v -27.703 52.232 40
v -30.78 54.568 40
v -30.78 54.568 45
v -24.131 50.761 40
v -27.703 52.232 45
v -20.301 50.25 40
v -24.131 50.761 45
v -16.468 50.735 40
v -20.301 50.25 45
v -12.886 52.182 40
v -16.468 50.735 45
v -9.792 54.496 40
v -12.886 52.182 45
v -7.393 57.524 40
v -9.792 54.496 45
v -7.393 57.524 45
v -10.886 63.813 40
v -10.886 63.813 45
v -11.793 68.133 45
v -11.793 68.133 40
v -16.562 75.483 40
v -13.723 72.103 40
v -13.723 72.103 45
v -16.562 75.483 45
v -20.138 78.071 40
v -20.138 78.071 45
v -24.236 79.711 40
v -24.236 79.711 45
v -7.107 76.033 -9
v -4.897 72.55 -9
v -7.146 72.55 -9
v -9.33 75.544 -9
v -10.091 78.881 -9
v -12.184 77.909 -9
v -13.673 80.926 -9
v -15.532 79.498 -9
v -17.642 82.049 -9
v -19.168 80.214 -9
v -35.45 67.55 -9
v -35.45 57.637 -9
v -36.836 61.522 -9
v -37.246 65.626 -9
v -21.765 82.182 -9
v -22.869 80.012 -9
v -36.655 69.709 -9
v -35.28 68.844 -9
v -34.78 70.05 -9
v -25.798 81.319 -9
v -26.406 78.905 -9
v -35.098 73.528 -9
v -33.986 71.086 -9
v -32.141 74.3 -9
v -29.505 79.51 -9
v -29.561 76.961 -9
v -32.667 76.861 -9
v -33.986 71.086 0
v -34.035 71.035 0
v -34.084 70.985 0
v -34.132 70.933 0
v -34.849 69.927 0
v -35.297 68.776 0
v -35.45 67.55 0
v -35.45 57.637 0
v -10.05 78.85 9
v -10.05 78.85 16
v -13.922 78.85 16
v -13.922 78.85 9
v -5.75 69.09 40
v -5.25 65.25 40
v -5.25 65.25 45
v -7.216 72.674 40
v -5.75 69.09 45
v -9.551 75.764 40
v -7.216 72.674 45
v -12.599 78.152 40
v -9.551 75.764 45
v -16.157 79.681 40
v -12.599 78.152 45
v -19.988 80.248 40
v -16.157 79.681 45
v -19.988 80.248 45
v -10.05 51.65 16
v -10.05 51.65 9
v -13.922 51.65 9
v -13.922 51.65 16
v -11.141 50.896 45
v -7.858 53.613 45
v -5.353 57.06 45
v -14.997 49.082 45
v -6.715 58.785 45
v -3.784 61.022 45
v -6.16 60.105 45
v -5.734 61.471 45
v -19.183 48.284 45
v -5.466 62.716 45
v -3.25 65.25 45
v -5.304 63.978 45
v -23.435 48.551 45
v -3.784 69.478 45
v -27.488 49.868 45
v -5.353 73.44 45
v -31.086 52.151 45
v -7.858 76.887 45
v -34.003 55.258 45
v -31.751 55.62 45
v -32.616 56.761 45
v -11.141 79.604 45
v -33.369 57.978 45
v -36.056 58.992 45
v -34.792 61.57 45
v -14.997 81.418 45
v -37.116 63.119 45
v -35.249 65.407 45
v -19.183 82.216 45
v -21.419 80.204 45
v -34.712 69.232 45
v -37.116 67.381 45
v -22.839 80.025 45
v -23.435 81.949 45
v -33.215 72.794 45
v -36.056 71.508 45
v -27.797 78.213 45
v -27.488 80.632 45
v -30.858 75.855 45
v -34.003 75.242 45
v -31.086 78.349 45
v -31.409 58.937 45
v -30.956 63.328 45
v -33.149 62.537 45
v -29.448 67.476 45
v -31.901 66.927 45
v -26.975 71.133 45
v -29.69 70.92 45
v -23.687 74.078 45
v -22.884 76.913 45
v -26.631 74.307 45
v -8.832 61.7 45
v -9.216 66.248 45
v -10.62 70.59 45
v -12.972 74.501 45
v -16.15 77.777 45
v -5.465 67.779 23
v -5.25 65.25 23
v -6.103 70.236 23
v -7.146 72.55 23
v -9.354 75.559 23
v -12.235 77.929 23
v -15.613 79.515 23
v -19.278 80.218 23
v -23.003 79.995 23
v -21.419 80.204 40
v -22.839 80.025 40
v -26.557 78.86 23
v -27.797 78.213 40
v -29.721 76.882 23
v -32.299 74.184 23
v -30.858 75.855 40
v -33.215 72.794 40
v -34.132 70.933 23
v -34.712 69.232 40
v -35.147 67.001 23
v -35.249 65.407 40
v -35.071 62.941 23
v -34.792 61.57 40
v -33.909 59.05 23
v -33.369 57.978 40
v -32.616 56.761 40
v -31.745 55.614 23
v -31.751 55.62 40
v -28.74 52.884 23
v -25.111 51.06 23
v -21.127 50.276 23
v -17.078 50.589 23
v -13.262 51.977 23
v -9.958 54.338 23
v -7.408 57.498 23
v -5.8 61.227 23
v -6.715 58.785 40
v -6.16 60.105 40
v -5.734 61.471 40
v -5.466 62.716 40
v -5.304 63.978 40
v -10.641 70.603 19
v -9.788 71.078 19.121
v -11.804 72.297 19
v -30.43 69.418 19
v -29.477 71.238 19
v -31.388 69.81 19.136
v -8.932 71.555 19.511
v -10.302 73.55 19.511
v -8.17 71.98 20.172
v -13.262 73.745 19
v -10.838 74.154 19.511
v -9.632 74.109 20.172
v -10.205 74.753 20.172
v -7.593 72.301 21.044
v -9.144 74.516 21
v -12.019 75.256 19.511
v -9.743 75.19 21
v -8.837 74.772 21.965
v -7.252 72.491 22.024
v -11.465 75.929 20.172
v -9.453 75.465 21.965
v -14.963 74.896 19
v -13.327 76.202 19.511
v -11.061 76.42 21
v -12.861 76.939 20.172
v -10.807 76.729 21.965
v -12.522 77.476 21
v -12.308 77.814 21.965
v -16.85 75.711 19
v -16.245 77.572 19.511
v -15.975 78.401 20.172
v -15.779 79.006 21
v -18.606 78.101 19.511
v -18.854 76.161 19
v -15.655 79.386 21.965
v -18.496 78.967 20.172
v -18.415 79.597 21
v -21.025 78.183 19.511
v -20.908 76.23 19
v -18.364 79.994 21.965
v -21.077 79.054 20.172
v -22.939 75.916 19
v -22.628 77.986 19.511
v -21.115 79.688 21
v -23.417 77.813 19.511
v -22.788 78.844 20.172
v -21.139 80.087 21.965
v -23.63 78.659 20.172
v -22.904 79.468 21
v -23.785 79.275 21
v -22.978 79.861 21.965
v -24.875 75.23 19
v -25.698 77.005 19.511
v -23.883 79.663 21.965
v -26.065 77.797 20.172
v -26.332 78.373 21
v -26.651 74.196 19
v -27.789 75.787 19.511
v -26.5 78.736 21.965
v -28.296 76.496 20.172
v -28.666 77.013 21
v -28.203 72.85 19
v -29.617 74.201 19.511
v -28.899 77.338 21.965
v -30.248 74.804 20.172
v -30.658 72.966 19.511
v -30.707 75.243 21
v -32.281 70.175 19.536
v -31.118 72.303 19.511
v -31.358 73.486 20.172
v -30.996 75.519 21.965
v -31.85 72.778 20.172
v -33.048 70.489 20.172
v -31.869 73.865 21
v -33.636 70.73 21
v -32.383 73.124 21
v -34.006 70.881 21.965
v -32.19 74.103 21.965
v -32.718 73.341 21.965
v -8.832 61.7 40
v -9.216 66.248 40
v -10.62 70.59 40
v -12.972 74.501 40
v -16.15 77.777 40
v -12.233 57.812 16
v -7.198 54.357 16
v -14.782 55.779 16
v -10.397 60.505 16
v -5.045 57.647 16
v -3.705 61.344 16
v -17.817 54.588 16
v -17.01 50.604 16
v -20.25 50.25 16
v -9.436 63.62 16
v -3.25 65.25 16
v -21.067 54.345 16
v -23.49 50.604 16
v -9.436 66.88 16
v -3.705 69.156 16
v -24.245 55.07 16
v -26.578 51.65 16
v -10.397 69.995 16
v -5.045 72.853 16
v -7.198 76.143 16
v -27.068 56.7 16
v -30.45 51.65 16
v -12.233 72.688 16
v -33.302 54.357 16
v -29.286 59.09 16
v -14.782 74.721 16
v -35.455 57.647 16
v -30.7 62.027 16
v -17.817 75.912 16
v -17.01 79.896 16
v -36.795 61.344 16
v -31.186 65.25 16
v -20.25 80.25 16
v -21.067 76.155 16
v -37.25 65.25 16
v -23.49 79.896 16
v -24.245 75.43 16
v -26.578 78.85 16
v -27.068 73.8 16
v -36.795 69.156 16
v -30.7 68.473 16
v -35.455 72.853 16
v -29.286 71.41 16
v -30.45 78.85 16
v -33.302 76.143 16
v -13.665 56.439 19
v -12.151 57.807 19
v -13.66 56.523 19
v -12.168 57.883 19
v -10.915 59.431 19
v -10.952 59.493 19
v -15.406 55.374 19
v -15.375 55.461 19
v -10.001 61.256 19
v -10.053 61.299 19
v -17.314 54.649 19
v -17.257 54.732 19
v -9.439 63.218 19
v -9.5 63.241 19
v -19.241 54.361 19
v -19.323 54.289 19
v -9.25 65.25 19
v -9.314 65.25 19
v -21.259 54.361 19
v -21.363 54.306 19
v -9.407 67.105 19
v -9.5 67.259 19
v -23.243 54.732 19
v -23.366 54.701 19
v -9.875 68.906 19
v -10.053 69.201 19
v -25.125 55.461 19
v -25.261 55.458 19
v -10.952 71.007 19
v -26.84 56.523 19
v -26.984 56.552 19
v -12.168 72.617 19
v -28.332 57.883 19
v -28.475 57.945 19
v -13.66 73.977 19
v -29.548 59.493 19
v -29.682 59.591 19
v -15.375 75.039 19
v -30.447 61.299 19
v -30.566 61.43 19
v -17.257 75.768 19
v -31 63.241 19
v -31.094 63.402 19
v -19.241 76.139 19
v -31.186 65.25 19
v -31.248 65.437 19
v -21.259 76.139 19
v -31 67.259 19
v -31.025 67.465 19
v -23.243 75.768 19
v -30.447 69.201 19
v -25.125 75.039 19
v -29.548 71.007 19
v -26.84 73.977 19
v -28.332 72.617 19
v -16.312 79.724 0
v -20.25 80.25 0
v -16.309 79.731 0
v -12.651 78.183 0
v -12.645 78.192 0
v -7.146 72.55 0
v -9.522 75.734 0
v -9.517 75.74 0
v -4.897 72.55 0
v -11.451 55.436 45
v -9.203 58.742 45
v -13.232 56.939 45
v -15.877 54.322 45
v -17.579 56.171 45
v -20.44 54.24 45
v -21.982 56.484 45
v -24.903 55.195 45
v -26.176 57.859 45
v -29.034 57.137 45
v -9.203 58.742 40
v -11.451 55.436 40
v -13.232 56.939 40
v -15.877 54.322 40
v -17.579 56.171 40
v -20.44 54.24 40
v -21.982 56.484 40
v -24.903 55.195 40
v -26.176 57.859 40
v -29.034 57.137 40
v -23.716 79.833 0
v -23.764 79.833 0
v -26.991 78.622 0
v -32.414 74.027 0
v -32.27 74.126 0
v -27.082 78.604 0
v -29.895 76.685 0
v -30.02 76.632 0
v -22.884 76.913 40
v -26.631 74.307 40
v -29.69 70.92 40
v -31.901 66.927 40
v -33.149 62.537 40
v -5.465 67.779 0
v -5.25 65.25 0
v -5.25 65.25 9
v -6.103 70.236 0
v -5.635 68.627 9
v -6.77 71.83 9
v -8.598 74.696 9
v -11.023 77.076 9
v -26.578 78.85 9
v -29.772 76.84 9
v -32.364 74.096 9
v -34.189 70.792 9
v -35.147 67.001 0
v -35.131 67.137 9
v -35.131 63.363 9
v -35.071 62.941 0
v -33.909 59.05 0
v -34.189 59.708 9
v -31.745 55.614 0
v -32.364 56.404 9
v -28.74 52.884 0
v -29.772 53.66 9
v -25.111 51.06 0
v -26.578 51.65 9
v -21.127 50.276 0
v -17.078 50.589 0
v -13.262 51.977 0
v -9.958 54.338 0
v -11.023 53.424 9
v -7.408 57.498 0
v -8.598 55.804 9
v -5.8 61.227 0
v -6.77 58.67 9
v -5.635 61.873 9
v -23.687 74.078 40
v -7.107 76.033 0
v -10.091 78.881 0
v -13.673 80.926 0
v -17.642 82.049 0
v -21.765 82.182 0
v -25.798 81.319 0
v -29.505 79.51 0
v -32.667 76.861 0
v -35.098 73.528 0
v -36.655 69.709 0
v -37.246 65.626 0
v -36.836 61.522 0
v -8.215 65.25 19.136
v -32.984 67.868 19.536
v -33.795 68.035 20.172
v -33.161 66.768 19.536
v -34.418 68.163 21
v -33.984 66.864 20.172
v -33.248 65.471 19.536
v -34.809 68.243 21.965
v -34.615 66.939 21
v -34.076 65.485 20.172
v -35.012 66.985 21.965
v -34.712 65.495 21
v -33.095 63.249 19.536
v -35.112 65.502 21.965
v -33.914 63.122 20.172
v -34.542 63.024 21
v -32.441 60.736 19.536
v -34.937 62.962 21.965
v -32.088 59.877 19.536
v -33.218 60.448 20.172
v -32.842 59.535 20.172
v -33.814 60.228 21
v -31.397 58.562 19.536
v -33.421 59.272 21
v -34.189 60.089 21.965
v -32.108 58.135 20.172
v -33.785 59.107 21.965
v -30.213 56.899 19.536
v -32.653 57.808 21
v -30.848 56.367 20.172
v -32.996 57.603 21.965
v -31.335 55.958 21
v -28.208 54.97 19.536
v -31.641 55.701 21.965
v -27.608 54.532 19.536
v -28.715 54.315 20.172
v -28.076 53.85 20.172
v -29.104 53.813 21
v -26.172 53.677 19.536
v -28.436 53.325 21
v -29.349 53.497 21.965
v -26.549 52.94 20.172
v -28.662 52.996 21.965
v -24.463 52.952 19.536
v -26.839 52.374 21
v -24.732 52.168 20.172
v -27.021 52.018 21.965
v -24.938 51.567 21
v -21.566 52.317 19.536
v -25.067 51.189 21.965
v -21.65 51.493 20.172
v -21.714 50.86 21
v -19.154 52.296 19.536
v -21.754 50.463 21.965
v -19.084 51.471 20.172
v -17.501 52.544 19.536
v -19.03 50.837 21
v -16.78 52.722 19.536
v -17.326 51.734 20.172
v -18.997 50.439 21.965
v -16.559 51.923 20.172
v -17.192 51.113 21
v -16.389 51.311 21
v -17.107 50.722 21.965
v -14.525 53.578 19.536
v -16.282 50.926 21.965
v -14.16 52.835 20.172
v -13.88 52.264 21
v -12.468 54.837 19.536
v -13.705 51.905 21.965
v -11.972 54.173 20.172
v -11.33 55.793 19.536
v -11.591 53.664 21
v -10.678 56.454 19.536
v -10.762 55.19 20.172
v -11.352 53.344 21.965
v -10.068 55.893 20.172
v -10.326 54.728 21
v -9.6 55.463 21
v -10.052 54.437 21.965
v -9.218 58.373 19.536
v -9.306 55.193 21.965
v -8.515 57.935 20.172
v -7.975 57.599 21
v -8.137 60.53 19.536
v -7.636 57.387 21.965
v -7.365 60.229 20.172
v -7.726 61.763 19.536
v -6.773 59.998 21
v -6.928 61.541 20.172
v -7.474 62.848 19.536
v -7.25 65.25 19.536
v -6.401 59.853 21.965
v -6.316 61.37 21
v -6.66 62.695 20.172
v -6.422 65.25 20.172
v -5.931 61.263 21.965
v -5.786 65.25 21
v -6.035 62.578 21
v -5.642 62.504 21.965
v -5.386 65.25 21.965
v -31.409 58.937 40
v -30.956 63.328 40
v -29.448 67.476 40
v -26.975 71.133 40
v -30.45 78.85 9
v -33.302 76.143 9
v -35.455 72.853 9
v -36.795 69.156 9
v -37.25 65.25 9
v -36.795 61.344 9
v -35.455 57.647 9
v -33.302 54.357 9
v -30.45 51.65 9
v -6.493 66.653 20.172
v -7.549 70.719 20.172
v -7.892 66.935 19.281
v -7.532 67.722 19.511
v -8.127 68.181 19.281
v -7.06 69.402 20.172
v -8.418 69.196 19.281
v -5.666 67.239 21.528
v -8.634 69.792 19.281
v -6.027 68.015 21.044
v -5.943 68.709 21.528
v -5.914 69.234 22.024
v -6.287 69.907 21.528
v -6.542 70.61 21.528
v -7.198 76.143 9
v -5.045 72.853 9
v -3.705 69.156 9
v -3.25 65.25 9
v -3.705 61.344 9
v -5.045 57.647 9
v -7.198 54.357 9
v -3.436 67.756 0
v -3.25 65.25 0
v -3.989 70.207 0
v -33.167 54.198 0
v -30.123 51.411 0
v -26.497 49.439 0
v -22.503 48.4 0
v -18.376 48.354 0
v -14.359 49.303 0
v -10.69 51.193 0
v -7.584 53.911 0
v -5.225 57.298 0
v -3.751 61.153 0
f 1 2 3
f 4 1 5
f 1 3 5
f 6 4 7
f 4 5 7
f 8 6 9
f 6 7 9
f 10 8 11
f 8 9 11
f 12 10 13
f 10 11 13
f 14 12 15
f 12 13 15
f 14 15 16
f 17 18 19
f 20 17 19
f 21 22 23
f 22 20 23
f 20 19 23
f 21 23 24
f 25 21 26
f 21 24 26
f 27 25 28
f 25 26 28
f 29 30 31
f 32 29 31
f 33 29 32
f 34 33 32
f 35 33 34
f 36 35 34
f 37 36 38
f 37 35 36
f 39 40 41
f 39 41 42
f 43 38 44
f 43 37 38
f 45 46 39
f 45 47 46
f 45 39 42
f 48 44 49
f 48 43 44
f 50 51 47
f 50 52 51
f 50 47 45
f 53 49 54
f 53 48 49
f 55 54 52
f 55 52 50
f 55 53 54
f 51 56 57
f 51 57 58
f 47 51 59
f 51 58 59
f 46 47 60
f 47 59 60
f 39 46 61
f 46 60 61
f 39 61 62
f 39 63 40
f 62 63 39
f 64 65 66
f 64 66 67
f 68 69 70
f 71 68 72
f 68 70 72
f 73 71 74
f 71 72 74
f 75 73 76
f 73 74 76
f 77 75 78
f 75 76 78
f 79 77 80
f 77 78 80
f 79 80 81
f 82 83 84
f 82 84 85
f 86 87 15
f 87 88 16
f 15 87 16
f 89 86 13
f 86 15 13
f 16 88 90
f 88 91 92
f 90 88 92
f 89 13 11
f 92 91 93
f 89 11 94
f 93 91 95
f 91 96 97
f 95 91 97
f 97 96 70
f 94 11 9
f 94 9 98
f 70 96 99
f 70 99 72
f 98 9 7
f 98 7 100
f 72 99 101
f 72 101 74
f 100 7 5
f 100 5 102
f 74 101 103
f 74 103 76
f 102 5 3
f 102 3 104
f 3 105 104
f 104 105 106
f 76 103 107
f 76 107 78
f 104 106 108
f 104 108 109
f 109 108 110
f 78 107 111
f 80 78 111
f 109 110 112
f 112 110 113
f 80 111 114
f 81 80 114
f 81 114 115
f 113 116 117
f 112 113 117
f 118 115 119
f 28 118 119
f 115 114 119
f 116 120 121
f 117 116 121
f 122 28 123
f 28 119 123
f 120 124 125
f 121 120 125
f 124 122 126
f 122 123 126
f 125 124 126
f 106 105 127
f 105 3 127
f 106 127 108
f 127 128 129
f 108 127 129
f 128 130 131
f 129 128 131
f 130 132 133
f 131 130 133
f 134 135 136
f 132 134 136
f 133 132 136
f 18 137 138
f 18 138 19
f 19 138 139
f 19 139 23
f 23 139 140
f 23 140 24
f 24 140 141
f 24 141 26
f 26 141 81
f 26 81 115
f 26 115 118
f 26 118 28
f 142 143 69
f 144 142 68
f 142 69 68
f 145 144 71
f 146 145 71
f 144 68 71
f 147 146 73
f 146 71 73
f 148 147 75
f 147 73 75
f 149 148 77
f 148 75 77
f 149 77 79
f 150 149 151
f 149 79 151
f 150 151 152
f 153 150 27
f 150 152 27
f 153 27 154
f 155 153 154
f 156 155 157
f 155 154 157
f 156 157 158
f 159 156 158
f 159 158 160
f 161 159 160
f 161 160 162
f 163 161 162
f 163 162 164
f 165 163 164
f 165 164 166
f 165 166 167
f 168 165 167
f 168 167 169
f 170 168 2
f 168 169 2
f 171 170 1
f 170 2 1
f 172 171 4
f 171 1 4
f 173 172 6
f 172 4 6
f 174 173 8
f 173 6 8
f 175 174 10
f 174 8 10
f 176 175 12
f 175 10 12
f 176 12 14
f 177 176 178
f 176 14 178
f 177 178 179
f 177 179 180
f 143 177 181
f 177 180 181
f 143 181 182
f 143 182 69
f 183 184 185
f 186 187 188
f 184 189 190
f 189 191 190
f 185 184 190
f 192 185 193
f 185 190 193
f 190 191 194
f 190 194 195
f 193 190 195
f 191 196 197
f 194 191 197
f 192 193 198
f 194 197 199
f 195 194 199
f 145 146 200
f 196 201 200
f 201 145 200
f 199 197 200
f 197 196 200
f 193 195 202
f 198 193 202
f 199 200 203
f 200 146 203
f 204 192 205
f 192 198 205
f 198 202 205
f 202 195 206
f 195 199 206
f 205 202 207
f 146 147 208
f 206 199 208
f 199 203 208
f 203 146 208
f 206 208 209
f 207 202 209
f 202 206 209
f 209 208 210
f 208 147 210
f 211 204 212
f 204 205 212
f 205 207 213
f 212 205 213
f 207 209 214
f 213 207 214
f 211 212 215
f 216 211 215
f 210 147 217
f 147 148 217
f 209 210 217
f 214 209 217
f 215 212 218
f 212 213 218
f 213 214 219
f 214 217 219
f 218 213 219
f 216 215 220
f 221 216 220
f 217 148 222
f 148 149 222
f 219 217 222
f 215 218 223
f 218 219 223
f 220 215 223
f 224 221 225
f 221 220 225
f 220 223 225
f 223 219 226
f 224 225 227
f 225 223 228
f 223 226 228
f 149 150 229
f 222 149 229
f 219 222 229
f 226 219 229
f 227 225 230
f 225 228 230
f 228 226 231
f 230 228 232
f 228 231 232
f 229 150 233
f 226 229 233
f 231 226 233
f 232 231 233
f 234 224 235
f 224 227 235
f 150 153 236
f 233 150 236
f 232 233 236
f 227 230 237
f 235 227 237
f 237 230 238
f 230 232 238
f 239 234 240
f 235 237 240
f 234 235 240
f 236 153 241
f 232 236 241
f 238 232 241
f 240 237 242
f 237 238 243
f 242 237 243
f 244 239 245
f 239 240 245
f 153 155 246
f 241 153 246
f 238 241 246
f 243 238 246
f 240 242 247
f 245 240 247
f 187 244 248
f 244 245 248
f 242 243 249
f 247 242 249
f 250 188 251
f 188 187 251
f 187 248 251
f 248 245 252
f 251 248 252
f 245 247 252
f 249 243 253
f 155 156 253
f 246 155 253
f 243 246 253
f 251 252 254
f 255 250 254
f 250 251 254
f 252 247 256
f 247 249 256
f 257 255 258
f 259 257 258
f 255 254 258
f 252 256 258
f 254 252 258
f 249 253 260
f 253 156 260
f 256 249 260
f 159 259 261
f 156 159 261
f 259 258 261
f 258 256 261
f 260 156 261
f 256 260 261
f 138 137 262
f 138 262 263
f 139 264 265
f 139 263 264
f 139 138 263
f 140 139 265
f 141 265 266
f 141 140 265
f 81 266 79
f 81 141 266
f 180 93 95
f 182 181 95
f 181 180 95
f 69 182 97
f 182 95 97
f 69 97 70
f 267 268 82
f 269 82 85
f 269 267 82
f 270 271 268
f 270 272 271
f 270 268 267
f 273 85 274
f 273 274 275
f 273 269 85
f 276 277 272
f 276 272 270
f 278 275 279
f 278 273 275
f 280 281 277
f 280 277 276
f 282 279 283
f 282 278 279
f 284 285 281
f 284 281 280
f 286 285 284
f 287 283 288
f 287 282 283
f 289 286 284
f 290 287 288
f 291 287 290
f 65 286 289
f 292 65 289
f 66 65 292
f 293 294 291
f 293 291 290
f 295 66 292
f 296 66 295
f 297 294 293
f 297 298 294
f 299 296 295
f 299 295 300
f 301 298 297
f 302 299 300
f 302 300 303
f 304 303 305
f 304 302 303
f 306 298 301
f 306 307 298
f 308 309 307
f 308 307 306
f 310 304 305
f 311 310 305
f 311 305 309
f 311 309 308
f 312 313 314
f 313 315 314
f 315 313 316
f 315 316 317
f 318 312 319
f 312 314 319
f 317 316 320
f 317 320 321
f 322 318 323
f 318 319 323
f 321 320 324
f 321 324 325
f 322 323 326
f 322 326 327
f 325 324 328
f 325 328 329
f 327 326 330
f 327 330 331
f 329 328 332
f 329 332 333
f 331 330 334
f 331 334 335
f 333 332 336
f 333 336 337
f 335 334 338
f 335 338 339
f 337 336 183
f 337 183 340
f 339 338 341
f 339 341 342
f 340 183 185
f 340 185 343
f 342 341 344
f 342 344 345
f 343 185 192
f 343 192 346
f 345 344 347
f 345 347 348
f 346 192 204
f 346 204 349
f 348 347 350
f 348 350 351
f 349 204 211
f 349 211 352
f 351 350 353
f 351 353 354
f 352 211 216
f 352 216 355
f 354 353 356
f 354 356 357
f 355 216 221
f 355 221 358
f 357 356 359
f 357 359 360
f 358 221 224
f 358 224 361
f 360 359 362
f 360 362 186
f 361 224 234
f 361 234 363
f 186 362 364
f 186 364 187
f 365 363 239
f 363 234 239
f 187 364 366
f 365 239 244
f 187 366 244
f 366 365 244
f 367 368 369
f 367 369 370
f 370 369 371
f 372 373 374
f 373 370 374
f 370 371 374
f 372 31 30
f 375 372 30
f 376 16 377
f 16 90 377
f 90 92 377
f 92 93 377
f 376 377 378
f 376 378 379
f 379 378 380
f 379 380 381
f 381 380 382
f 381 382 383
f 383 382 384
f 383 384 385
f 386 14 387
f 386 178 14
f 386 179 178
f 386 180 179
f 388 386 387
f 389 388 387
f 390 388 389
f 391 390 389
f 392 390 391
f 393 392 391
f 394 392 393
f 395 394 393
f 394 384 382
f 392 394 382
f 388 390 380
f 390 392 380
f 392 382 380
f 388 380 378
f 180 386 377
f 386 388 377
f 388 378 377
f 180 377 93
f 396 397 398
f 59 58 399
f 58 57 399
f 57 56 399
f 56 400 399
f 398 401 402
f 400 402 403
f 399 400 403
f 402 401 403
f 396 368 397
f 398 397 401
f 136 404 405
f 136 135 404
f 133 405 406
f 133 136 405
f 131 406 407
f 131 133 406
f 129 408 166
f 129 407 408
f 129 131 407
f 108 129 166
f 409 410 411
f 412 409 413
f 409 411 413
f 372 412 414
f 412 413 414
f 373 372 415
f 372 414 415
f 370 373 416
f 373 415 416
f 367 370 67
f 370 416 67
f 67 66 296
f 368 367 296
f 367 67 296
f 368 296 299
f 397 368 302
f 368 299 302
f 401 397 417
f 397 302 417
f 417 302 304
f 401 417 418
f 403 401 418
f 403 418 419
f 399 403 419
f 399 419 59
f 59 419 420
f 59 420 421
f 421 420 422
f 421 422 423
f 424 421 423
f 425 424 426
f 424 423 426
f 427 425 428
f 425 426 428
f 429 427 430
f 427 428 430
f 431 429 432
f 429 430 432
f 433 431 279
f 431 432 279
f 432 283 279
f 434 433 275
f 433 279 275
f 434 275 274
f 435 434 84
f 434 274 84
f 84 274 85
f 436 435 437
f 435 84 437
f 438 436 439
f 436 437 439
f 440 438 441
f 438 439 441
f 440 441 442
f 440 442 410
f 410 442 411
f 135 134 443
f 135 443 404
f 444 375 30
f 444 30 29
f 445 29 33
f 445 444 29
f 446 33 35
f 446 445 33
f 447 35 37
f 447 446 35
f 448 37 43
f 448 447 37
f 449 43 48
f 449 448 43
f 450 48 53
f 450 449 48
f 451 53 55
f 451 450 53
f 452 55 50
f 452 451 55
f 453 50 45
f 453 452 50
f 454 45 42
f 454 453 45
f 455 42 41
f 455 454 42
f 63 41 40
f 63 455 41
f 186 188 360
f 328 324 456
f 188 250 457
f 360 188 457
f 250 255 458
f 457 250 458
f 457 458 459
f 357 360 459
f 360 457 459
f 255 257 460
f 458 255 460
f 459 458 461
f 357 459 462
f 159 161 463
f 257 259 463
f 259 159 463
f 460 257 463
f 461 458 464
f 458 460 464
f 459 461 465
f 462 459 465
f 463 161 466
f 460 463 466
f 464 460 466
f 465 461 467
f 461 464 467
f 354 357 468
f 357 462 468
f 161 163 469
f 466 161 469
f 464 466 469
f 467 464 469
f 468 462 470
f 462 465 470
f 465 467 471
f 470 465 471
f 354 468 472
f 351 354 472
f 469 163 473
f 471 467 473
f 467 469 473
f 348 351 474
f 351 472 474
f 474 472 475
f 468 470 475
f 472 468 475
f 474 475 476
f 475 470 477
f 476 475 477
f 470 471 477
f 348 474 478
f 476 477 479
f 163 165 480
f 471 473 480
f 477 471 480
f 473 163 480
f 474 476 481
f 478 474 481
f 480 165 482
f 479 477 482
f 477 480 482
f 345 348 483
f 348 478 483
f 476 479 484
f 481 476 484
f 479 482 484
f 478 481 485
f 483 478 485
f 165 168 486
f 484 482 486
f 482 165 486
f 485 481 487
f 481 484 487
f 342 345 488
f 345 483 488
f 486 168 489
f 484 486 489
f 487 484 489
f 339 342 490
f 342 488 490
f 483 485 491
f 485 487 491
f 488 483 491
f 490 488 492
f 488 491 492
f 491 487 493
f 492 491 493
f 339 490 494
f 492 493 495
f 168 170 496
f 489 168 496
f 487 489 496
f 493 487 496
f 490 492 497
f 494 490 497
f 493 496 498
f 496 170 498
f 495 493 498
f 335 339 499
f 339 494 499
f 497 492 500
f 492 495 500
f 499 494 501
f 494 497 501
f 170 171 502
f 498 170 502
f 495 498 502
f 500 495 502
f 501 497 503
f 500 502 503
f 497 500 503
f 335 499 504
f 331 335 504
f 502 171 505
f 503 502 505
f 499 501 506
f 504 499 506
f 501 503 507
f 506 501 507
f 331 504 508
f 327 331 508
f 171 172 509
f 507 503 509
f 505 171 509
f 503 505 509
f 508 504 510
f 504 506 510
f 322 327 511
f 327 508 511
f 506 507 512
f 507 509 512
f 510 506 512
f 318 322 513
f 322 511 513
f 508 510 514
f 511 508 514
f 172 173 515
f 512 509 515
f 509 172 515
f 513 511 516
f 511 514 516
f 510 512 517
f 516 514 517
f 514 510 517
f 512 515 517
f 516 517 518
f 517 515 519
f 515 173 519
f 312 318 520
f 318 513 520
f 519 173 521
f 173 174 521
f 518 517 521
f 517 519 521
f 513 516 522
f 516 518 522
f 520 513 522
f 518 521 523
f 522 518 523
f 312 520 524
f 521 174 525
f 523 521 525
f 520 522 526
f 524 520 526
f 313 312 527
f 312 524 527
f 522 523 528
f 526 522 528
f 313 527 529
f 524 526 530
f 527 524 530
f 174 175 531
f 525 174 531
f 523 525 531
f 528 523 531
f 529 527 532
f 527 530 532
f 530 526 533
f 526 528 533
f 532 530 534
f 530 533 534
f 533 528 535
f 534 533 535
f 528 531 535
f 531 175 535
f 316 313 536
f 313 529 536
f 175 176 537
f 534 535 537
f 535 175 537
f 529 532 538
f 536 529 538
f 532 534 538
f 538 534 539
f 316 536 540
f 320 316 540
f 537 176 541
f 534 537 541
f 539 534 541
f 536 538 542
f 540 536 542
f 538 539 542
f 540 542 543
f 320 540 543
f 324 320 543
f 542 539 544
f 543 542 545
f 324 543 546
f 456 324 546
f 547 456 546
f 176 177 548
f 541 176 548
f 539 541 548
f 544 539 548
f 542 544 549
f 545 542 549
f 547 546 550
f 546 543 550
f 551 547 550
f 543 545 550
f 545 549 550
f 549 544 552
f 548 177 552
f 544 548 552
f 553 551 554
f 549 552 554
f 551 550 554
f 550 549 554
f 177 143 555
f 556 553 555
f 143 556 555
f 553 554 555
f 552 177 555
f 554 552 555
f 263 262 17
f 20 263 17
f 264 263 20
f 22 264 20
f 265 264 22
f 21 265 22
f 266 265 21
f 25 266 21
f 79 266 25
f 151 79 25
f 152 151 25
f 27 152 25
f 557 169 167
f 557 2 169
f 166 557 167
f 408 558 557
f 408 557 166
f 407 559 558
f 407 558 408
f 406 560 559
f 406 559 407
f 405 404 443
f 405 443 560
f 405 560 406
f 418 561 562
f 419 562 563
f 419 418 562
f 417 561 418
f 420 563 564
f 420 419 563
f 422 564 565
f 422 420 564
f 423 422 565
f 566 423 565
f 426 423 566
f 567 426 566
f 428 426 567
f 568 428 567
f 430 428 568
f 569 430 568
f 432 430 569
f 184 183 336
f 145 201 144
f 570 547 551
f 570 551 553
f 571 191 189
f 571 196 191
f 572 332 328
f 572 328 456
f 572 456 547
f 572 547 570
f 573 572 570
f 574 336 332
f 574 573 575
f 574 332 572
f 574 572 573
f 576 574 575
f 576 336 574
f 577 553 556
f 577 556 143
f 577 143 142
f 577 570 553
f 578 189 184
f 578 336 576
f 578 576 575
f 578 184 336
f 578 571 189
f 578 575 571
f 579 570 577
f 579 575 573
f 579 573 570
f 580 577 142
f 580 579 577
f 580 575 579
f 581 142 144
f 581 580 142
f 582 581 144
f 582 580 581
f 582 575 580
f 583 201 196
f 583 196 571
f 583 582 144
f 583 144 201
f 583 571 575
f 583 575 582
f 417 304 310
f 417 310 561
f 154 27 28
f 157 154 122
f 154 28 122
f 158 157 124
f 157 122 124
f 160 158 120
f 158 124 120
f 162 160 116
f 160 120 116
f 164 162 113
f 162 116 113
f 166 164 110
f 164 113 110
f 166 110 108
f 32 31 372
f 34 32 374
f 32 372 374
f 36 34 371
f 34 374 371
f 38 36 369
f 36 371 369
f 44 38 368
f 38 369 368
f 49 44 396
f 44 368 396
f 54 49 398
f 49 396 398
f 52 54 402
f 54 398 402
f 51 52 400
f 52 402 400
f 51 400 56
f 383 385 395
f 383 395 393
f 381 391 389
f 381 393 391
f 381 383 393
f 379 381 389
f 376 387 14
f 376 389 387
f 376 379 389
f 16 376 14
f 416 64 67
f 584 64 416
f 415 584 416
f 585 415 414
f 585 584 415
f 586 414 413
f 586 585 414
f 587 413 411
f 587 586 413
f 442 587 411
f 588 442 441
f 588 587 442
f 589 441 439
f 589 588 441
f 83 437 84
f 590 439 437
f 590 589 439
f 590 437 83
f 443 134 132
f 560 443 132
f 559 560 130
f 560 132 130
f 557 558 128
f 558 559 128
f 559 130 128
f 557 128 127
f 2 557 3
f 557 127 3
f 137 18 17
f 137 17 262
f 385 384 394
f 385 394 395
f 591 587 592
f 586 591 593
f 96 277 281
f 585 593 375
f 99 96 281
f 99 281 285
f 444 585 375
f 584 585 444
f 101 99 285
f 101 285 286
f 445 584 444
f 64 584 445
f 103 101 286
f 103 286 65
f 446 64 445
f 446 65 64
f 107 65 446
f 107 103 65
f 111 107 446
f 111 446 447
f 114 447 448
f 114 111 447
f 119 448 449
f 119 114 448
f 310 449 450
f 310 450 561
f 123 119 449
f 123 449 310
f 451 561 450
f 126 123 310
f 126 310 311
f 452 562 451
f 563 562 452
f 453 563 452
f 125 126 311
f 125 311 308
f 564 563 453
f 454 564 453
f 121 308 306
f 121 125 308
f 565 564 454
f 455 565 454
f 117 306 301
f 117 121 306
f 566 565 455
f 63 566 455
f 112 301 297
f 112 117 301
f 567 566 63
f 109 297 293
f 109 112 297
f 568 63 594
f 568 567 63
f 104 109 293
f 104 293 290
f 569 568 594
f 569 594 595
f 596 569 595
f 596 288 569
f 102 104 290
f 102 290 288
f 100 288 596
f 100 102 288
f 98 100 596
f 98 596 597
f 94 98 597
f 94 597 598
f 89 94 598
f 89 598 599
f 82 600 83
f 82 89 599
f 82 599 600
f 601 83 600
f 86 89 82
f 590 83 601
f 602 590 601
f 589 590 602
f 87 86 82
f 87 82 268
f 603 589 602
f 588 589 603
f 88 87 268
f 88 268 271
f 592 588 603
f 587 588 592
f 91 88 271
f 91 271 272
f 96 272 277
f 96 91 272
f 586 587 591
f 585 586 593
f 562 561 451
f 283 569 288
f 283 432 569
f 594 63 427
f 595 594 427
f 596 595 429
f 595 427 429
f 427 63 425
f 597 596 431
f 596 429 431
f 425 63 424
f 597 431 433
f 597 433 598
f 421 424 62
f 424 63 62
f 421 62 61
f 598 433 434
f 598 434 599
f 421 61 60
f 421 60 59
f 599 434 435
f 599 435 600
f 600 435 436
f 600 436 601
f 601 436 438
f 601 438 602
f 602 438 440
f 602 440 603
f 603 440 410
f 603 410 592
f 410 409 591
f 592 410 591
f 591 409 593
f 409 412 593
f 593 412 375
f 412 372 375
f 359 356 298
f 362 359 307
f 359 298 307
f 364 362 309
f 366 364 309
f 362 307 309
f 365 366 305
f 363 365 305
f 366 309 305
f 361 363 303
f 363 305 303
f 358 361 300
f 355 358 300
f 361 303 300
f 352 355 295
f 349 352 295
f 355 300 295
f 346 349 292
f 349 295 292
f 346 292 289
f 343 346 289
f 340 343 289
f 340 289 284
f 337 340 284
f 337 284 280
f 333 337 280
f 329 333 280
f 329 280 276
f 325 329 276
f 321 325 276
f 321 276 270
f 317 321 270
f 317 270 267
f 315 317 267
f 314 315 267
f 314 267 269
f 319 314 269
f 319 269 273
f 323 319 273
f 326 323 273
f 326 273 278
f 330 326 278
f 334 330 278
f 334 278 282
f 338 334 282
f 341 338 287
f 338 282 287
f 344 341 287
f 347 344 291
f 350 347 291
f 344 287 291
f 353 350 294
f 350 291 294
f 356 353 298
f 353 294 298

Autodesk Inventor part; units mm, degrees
ref_plane "YZ Plane" through (0, 0, 0) normal (1, 0, 0) x (0, 1, 0)
ref_plane "Work Plane1" through (-20.25, 65.25, 45) normal (0, 0, -1) x (-1, 0, 0)
sketch "Sketch1" plane through (-20.25, 65.25, 45) normal (0, 0, -1) x (-1, 0, 0)
  circle A0 centre (0, 0) radius 15 construction
  circle A1 centre (0, 0) radius 15
  arc A2 (3.985843, 14.460742) -> (-9.363563, -1.43693) centre (8.57316, -2.944905) ccw
  arc A3 (-0.262145, 14.997709) -> (-11.417671, -3.55046) centre (8.57316, -2.944905) ccw
  circle A4 centre (0, 0) radius 17
  arc A5 (-3.177912, 14.659498) -> (-0.262145, 14.997709) centre (0, 0) ccw
  line L0 (-9.363563, -1.43693) -> (-11.417671, -3.55046)
  point P0 (-20.25, -65.25)
  dimension "d0" = 30
  dimension "d1" = 18
  dimension "d2" = 20
  dimension "d3" = 34
extrude "Extrusion1" add sketch "Sketch1" along normal blind 5 contours A2 L0 A3 A1 | A4 picked at (-9.618407, 0.814563)
pattern_circular "Circular Pattern1" count 3 over 360 about axis through (-20.25, 65.25, 45) along (0, 0, -1) of "Extrusion1"
sketch "Sketch2" plane through (-20.25, 65.25, 45) normal (0, 0, 1) x (1, 0, 0)
  circle A0 centre (0, 0) radius 17 projected
  circle A1 centre (0, 0) radius 15
  point P0 (20.25, -65.25)
ref_plane "Work Plane2" through (-33.45, -70.55, 0) normal (0, 0, 1) x (1, 0, 0)
extrude "Extrusion2" add sketch "Sketch2" against normal up to surface (45 mm away)
sketch "Sketch3" plane through (-20.25, 65.25, 0) normal (0, 0, -1) x (-1, 0, 0)
  circle A0 centre (0, 0) radius 15 construction
  circle A1 centre (0, 0) radius 17 construction
  line L0 (15.2, -132.8) -> (15.2, 2.3)
  arc A2 (15.2, 2.3) -> (10.2, 7.3) centre (10.2, 2.3) ccw
  line L1 (10.2, 7.3) -> (-50.7, 7.3)
  circle A3 centre (0, 0) radius 17 construction
  arc A4 (13.11947, -7.271831) -> (3.985843, 14.460742) centre (0, 0) ccw construction
  arc A5 (15.2, -7.613147) -> (-15.35285, 7.3) centre (0, 0) ccw
  arc A6 (13.735534, 5.835534) -> (-13.103816, 7.3) centre (-0.038894, 0.06619) ccw
  point P0 (-20.25, -65.25)
ref_plane "Work Plane3" through (-33.45, -70.55, -7.1) normal (0, 0, -1) x (0, 1, 0)
extrude "Extrusion3" add sketch "Sketch3" along normal blind 9 contours L0 A2 A6 L1 A5
sketch "Sketch4" plane through (0, 0, 0) normal (1, 0, 0) x (0, 1, 0)
  line L0 (52.65, 10) -> (77.85, 10) construction
  line L1 (77.85, 15) -> (52.65, 15) construction
  line L2 (52.65, 10) -> (52.65, 15) construction
  line L3 (77.85, 10) -> (77.85, 15) construction
  line L4 (52.65, 10) -> (77.85, 10) construction
  line L5 (77.85, 10) -> (77.85, 15) construction
  line L6 (77.85, 15) -> (52.65, 15) construction
  line L7 (52.65, 15) -> (52.65, 10) construction
  line L8 (51.65, 16) -> (78.85, 16)
  line L9 (78.85, 16) -> (78.85, 9)
  line L10 (78.85, 9) -> (51.65, 9)
  line L11 (51.65, 9) -> (51.65, 16)
  point P0 (0, 0)
  dimension "d13" = 1
extrude "Extrusion4" cut sketch "Sketch4" against normal through all
sketch "Sketch5" plane through (-26.577717, 51.65, 16) normal (0, 0, -1) x (-1, 0, 0)
  arc A0 (-19.431533, 20.9) -> (7.554064, 19.28297) centre (-6.327717, 13.6) ccw
  circle A1 centre (-6.327717, 13.6) radius 15
  circle A2 centre (-6.327717, 13.6) radius 10.935902
  point P0 (-26.577717, -51.65)
extrude "Extrusion5" add sketch "Sketch5" against normal blind 3
fillet "Fillet1" radius 4 1 edges at (-35.25, 65.25, 19)
properties part number "10_P9_RMS_Fluofilter"
